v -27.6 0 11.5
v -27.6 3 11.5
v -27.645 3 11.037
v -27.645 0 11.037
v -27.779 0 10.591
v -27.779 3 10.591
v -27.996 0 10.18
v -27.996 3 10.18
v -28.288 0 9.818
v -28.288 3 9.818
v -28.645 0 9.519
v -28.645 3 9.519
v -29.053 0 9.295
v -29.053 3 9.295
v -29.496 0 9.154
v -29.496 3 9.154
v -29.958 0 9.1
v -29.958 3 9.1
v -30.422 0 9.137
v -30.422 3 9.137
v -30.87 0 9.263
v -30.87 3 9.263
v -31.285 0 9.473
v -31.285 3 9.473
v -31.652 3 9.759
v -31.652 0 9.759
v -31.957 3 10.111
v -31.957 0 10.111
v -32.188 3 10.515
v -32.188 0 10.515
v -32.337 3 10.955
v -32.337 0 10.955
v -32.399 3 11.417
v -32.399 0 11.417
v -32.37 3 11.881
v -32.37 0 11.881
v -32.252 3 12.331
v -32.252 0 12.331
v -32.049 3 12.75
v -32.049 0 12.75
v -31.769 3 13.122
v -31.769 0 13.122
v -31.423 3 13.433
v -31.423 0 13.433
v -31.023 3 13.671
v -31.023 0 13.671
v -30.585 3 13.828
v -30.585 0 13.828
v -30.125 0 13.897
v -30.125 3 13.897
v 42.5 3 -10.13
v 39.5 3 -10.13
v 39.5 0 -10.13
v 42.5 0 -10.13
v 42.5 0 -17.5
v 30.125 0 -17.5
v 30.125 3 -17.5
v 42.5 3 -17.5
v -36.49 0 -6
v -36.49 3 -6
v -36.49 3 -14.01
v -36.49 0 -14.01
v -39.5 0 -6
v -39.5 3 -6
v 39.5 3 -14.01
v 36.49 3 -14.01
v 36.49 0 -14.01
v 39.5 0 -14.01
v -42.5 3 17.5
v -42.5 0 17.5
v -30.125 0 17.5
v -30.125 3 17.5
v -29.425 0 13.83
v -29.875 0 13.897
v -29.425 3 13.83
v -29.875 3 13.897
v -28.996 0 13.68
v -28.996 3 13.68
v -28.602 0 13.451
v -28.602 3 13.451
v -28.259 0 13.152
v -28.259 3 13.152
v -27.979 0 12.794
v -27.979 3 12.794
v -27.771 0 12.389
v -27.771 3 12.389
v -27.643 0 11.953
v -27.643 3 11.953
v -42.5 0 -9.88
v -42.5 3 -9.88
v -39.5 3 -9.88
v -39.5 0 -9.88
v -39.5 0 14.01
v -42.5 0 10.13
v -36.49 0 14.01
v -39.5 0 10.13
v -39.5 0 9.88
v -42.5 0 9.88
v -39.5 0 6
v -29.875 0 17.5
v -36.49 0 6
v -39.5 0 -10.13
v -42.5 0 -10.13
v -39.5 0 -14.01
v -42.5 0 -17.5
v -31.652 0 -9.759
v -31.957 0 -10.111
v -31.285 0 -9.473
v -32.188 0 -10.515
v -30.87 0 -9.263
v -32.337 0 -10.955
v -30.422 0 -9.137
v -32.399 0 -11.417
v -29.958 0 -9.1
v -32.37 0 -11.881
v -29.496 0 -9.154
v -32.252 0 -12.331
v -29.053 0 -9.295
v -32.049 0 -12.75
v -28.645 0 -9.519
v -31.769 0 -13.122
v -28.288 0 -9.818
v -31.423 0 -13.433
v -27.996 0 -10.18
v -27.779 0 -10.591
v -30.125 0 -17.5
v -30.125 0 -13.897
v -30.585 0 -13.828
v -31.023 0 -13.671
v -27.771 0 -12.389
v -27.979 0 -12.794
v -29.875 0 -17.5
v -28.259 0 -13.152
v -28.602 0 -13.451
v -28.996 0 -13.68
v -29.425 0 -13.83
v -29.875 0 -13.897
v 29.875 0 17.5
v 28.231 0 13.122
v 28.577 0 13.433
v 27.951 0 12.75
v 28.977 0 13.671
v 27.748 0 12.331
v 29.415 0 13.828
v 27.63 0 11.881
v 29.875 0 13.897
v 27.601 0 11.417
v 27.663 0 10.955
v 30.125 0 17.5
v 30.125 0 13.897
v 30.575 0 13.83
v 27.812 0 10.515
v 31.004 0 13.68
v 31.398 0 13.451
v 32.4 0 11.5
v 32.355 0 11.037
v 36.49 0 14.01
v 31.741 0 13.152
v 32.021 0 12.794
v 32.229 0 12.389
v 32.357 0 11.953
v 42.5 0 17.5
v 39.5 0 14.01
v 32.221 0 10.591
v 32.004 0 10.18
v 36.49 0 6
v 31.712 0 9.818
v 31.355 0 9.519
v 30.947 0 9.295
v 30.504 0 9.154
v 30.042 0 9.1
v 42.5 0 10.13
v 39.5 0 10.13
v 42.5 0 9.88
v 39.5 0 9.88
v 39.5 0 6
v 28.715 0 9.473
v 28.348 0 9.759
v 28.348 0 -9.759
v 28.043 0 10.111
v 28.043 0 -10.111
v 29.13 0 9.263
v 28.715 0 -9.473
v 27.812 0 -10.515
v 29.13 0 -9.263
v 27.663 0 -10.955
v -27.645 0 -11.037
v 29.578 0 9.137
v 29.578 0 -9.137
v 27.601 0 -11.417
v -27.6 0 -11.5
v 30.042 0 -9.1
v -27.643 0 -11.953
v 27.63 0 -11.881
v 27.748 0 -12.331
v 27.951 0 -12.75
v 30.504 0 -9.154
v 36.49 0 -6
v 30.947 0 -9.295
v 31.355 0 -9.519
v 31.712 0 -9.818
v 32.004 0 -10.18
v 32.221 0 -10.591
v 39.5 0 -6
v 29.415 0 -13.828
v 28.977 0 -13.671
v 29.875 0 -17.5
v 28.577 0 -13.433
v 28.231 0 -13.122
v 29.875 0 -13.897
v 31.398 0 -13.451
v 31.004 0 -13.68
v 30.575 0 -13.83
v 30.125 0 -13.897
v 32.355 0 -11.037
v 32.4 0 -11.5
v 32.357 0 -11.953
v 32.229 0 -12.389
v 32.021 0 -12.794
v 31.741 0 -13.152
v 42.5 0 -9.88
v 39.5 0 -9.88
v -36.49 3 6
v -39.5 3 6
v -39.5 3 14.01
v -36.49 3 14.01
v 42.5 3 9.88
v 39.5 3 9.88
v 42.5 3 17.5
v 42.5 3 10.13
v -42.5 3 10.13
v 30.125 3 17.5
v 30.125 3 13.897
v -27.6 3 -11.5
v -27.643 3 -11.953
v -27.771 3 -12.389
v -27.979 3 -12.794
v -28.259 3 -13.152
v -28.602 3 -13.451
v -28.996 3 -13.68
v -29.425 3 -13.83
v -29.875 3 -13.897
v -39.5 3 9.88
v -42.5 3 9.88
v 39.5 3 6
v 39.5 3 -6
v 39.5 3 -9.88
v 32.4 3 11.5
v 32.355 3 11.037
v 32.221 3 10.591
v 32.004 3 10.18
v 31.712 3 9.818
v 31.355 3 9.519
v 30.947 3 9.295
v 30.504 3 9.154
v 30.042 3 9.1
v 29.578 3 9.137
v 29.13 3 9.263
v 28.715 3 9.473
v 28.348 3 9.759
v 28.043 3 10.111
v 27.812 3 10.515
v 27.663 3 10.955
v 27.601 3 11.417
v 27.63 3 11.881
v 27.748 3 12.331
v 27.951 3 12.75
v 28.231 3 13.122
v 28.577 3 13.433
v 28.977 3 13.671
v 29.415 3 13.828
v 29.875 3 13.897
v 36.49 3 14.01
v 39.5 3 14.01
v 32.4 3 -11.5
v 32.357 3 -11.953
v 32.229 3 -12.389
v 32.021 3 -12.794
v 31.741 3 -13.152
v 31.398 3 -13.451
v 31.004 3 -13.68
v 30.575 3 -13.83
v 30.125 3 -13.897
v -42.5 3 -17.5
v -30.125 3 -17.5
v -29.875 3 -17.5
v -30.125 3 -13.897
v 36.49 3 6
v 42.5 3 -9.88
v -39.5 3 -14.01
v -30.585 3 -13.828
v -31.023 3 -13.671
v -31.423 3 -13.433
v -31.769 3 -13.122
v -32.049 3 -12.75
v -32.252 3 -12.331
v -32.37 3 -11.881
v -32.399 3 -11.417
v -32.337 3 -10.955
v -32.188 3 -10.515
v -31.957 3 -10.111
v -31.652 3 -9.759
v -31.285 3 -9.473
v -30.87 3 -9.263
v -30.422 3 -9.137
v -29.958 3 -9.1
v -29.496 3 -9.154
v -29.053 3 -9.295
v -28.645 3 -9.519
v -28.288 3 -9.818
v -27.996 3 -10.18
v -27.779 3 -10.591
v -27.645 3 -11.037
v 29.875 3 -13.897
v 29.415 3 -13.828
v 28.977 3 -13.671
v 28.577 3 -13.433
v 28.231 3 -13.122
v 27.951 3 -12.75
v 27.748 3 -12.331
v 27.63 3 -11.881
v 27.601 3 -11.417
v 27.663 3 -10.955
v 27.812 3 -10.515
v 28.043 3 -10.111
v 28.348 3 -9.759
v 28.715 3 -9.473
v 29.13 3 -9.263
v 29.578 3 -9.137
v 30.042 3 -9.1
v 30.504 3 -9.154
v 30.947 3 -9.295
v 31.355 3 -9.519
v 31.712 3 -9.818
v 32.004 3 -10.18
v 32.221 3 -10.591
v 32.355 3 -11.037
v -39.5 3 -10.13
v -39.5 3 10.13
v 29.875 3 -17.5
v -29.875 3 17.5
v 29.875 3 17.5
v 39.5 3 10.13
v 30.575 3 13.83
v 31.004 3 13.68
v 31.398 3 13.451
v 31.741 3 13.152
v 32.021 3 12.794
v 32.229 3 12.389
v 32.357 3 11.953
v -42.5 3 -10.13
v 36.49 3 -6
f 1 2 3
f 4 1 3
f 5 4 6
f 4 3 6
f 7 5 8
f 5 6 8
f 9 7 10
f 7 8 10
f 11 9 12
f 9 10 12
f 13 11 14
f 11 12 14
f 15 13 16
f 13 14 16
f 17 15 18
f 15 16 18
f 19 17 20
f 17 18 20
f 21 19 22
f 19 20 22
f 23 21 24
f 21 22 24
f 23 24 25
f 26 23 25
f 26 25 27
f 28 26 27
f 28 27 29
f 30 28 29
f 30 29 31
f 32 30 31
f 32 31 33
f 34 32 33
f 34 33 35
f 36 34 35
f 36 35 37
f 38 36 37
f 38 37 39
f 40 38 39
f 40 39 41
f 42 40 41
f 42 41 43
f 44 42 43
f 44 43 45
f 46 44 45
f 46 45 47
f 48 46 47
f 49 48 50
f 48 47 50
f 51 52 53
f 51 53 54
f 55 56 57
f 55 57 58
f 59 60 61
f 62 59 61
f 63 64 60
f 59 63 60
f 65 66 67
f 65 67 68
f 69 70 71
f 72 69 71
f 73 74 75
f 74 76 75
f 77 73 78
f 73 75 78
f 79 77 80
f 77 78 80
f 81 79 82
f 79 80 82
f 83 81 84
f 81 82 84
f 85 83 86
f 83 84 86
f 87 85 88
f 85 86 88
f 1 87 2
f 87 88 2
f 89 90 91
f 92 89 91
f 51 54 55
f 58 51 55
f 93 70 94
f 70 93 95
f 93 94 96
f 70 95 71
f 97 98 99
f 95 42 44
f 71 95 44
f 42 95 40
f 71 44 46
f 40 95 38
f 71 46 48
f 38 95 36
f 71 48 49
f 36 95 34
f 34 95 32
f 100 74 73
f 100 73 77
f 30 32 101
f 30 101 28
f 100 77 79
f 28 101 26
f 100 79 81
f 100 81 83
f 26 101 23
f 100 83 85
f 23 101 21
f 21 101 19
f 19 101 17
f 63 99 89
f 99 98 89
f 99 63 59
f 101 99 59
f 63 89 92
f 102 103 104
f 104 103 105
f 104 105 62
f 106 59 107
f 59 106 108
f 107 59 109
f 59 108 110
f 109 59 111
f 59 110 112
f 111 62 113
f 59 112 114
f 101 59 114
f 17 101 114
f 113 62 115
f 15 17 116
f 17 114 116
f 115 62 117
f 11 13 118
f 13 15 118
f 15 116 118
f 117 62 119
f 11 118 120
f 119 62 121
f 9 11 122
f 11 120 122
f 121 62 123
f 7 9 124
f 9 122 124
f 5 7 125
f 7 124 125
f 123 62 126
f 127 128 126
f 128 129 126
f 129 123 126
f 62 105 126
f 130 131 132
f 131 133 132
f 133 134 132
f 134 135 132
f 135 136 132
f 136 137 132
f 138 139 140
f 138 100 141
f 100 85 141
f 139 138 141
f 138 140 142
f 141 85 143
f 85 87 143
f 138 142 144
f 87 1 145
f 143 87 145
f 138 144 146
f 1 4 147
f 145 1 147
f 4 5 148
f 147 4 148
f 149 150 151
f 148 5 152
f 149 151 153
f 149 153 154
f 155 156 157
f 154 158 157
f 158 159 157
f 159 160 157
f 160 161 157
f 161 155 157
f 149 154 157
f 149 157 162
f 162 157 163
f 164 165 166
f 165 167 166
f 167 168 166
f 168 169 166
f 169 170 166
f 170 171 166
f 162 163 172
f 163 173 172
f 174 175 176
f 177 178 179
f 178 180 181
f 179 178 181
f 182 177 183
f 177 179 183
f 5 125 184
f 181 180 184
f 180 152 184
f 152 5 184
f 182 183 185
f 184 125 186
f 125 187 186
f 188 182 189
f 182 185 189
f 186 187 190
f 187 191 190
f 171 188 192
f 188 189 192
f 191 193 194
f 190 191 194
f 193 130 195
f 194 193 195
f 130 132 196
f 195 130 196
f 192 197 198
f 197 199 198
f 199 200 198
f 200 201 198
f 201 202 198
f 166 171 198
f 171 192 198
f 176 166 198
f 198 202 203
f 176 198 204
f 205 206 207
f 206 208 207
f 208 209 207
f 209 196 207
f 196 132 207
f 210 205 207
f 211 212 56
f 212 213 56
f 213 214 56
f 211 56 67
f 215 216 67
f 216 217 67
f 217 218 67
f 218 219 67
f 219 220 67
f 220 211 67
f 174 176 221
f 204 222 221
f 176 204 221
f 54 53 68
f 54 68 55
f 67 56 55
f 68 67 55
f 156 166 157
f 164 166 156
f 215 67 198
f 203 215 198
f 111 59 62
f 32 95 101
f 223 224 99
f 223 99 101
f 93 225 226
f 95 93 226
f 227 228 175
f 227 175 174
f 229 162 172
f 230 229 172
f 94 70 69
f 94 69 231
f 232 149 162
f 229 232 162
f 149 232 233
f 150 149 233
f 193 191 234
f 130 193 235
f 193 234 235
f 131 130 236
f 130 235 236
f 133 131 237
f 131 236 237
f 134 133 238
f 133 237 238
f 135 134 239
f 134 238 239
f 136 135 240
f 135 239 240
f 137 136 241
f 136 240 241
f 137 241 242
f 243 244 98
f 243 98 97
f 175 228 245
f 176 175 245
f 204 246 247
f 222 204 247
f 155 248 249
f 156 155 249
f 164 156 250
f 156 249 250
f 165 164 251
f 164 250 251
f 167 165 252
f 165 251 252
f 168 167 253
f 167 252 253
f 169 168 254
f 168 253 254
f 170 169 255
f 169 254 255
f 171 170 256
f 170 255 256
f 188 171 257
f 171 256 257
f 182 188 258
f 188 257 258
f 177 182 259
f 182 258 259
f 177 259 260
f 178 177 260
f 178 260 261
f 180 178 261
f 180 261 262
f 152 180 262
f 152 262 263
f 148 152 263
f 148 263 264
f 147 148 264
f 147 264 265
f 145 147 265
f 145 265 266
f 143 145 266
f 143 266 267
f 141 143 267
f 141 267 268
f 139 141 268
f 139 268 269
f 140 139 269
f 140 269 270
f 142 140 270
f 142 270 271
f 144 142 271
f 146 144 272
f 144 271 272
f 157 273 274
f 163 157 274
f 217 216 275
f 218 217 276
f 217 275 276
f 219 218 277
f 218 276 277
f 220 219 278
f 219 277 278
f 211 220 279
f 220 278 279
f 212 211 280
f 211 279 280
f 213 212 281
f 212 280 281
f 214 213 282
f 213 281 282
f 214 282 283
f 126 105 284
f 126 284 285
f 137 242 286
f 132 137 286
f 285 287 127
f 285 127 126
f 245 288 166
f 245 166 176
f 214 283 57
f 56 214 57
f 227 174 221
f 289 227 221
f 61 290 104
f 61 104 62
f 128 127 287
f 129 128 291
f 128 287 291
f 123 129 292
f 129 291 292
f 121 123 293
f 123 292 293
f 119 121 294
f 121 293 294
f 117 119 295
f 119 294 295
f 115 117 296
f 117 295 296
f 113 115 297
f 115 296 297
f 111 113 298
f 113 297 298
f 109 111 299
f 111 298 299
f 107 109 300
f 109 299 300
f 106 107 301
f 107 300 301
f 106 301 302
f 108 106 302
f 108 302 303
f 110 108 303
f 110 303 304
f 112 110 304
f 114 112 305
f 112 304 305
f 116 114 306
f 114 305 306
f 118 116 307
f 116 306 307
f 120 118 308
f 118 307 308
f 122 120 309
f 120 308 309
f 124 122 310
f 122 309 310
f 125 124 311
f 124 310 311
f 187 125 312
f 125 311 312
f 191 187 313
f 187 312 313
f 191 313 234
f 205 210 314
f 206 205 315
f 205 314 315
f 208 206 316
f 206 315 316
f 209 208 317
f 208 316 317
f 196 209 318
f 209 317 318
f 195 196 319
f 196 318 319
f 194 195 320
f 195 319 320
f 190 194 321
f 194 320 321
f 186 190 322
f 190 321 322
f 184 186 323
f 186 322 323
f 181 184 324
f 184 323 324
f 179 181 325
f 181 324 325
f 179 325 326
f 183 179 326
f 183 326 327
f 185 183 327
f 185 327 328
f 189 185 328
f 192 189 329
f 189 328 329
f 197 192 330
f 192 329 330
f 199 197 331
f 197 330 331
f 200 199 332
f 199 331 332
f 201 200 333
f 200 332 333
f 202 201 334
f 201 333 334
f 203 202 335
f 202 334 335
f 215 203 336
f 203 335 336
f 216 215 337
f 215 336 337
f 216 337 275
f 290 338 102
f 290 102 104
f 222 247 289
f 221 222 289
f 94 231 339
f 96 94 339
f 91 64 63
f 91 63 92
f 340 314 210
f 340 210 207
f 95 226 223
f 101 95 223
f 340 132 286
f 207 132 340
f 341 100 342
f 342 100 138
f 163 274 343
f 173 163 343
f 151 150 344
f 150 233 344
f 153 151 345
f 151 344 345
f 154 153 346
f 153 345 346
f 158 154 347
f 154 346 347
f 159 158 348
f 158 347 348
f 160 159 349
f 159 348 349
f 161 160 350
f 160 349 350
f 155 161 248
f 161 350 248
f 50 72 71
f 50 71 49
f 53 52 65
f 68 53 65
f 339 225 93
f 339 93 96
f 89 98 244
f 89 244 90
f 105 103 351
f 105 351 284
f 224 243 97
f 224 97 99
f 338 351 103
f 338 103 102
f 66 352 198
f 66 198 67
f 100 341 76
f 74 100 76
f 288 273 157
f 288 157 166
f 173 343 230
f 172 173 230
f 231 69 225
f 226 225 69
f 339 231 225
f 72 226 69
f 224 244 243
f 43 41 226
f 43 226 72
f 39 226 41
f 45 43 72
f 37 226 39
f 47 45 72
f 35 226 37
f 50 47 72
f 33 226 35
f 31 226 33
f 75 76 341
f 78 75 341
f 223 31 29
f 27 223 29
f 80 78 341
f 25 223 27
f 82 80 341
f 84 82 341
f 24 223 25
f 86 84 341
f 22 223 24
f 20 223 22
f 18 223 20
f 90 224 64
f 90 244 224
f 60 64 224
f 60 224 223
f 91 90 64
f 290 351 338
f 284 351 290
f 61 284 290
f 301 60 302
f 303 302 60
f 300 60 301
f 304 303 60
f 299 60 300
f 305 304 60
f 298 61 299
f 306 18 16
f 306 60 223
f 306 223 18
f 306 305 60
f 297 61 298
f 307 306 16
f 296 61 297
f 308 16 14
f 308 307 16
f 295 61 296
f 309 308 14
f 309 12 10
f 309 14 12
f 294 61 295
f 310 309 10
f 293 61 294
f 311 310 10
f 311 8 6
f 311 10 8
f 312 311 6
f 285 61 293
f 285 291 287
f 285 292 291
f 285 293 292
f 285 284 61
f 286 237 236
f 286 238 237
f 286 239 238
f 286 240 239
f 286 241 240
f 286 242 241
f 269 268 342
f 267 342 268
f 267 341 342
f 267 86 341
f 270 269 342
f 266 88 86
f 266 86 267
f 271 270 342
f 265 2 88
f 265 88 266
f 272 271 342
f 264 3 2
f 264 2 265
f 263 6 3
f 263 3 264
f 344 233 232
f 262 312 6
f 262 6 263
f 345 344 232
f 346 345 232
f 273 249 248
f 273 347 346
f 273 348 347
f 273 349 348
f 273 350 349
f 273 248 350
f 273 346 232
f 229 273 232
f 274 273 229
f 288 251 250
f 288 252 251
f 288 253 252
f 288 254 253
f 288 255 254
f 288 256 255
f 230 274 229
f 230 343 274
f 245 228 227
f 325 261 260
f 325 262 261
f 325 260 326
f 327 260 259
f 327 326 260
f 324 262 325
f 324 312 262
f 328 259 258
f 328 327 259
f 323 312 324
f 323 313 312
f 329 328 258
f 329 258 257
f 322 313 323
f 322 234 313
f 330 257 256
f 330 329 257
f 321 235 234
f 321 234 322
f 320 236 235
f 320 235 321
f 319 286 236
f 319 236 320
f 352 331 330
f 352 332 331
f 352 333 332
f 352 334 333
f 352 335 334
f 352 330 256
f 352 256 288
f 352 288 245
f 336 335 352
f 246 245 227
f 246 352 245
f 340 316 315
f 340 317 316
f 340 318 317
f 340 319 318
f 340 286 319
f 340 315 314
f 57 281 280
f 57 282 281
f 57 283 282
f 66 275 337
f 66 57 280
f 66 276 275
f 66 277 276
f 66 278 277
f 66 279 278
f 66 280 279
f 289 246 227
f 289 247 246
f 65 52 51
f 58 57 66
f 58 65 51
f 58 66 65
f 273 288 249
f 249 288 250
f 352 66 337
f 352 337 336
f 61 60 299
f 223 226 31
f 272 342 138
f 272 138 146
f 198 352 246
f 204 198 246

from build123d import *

# Parameters (mm, degrees)
ESBO_O2_W                = 85
ESBO_O2_H                = 35
RESSALTO_EXTRUS_O2_DEPTH = 3
FURO_COM_FOLGA_DE_M41_D  = 4.8
ESBO_O10_W               = 3.01
ESBO_O10_H               = 8.01
CORTE_EXTRUS_O2_DEPTH    = 10
ESBO_O11_W               = 3
ESBO_O11_H               = 0.25
ESBO_O11_W_2             = 0.25
ESBO_O11_H_2             = 3.603257419
CORTE_EXTRUS_O3_DEPTH    = 47.059743812


with BuildPart() as part:
    # Esboço2 → Ressalto-extrusão2 (new body)
    with BuildSketch(Plane(origin=(0, 0, 0), x_dir=(1, 0, 0), z_dir=(0, 1, 0))):
        Rectangle(ESBO_O2_W, ESBO_O2_H)
    extrude(amount=RESSALTO_EXTRUS_O2_DEPTH)

    # Furo com folga de M41 (through all)
    with Locations(Plane(origin=(0, 0, 0), x_dir=(-1, 0, 0), z_dir=(0, -1, 0))):
        with Locations((30, -11.5), (30, 11.5), (-30, 11.5), (-30, -11.5)):
            Hole(FURO_COM_FOLGA_DE_M41_D / 2)

    # Esboço10 → Corte-extrusão2 (cut)
    with BuildSketch(Plane(origin=(0, 3, 0), x_dir=(1, 0, 0), z_dir=(0, 1, 0))):
        with Locations((-37.995, 10.005)):
            Rectangle(ESBO_O10_W, ESBO_O10_H)
        with Locations((-37.995, -10.005)):
            Rectangle(ESBO_O10_W, ESBO_O10_H)
        with Locations((37.995, -10.005)):
            Rectangle(ESBO_O10_W, ESBO_O10_H)
        with Locations((37.995, 10.005)):
            Rectangle(ESBO_O10_W, ESBO_O10_H)
    extrude(amount=-CORTE_EXTRUS_O2_DEPTH, mode=Mode.SUBTRACT)

    # Esboço11 → Corte-extrusão3 (cut, through all)
    with BuildSketch(Plane(origin=(0, 3, 0), x_dir=(1, 0, 0), z_dir=(0, 1, 0))):
        with Locations((-41, 10.005)):
            Rectangle(ESBO_O11_W, ESBO_O11_H)
        with Locations((-30, 15.698371291)):
            Rectangle(ESBO_O11_W_2, ESBO_O11_H_2)
        with Locations((-30, -15.698371291)):
            Rectangle(ESBO_O11_W_2, ESBO_O11_H_2)
        with Locations((-41, -10.005)):
            Rectangle(ESBO_O11_W, ESBO_O11_H)
        with Locations((41, -10.005)):
            Rectangle(ESBO_O11_W, ESBO_O11_H)
        with Locations((30, -15.698371291)):
            Rectangle(ESBO_O11_W_2, ESBO_O11_H_2)
        with Locations((30, 15.698371291)):
            Rectangle(ESBO_O11_W_2, ESBO_O11_H_2)
        with Locations((41, 10.005)):
            Rectangle(ESBO_O11_W, ESBO_O11_H)
    extrude(amount=-CORTE_EXTRUS_O3_DEPTH, mode=Mode.SUBTRACT)


solid = part.part
